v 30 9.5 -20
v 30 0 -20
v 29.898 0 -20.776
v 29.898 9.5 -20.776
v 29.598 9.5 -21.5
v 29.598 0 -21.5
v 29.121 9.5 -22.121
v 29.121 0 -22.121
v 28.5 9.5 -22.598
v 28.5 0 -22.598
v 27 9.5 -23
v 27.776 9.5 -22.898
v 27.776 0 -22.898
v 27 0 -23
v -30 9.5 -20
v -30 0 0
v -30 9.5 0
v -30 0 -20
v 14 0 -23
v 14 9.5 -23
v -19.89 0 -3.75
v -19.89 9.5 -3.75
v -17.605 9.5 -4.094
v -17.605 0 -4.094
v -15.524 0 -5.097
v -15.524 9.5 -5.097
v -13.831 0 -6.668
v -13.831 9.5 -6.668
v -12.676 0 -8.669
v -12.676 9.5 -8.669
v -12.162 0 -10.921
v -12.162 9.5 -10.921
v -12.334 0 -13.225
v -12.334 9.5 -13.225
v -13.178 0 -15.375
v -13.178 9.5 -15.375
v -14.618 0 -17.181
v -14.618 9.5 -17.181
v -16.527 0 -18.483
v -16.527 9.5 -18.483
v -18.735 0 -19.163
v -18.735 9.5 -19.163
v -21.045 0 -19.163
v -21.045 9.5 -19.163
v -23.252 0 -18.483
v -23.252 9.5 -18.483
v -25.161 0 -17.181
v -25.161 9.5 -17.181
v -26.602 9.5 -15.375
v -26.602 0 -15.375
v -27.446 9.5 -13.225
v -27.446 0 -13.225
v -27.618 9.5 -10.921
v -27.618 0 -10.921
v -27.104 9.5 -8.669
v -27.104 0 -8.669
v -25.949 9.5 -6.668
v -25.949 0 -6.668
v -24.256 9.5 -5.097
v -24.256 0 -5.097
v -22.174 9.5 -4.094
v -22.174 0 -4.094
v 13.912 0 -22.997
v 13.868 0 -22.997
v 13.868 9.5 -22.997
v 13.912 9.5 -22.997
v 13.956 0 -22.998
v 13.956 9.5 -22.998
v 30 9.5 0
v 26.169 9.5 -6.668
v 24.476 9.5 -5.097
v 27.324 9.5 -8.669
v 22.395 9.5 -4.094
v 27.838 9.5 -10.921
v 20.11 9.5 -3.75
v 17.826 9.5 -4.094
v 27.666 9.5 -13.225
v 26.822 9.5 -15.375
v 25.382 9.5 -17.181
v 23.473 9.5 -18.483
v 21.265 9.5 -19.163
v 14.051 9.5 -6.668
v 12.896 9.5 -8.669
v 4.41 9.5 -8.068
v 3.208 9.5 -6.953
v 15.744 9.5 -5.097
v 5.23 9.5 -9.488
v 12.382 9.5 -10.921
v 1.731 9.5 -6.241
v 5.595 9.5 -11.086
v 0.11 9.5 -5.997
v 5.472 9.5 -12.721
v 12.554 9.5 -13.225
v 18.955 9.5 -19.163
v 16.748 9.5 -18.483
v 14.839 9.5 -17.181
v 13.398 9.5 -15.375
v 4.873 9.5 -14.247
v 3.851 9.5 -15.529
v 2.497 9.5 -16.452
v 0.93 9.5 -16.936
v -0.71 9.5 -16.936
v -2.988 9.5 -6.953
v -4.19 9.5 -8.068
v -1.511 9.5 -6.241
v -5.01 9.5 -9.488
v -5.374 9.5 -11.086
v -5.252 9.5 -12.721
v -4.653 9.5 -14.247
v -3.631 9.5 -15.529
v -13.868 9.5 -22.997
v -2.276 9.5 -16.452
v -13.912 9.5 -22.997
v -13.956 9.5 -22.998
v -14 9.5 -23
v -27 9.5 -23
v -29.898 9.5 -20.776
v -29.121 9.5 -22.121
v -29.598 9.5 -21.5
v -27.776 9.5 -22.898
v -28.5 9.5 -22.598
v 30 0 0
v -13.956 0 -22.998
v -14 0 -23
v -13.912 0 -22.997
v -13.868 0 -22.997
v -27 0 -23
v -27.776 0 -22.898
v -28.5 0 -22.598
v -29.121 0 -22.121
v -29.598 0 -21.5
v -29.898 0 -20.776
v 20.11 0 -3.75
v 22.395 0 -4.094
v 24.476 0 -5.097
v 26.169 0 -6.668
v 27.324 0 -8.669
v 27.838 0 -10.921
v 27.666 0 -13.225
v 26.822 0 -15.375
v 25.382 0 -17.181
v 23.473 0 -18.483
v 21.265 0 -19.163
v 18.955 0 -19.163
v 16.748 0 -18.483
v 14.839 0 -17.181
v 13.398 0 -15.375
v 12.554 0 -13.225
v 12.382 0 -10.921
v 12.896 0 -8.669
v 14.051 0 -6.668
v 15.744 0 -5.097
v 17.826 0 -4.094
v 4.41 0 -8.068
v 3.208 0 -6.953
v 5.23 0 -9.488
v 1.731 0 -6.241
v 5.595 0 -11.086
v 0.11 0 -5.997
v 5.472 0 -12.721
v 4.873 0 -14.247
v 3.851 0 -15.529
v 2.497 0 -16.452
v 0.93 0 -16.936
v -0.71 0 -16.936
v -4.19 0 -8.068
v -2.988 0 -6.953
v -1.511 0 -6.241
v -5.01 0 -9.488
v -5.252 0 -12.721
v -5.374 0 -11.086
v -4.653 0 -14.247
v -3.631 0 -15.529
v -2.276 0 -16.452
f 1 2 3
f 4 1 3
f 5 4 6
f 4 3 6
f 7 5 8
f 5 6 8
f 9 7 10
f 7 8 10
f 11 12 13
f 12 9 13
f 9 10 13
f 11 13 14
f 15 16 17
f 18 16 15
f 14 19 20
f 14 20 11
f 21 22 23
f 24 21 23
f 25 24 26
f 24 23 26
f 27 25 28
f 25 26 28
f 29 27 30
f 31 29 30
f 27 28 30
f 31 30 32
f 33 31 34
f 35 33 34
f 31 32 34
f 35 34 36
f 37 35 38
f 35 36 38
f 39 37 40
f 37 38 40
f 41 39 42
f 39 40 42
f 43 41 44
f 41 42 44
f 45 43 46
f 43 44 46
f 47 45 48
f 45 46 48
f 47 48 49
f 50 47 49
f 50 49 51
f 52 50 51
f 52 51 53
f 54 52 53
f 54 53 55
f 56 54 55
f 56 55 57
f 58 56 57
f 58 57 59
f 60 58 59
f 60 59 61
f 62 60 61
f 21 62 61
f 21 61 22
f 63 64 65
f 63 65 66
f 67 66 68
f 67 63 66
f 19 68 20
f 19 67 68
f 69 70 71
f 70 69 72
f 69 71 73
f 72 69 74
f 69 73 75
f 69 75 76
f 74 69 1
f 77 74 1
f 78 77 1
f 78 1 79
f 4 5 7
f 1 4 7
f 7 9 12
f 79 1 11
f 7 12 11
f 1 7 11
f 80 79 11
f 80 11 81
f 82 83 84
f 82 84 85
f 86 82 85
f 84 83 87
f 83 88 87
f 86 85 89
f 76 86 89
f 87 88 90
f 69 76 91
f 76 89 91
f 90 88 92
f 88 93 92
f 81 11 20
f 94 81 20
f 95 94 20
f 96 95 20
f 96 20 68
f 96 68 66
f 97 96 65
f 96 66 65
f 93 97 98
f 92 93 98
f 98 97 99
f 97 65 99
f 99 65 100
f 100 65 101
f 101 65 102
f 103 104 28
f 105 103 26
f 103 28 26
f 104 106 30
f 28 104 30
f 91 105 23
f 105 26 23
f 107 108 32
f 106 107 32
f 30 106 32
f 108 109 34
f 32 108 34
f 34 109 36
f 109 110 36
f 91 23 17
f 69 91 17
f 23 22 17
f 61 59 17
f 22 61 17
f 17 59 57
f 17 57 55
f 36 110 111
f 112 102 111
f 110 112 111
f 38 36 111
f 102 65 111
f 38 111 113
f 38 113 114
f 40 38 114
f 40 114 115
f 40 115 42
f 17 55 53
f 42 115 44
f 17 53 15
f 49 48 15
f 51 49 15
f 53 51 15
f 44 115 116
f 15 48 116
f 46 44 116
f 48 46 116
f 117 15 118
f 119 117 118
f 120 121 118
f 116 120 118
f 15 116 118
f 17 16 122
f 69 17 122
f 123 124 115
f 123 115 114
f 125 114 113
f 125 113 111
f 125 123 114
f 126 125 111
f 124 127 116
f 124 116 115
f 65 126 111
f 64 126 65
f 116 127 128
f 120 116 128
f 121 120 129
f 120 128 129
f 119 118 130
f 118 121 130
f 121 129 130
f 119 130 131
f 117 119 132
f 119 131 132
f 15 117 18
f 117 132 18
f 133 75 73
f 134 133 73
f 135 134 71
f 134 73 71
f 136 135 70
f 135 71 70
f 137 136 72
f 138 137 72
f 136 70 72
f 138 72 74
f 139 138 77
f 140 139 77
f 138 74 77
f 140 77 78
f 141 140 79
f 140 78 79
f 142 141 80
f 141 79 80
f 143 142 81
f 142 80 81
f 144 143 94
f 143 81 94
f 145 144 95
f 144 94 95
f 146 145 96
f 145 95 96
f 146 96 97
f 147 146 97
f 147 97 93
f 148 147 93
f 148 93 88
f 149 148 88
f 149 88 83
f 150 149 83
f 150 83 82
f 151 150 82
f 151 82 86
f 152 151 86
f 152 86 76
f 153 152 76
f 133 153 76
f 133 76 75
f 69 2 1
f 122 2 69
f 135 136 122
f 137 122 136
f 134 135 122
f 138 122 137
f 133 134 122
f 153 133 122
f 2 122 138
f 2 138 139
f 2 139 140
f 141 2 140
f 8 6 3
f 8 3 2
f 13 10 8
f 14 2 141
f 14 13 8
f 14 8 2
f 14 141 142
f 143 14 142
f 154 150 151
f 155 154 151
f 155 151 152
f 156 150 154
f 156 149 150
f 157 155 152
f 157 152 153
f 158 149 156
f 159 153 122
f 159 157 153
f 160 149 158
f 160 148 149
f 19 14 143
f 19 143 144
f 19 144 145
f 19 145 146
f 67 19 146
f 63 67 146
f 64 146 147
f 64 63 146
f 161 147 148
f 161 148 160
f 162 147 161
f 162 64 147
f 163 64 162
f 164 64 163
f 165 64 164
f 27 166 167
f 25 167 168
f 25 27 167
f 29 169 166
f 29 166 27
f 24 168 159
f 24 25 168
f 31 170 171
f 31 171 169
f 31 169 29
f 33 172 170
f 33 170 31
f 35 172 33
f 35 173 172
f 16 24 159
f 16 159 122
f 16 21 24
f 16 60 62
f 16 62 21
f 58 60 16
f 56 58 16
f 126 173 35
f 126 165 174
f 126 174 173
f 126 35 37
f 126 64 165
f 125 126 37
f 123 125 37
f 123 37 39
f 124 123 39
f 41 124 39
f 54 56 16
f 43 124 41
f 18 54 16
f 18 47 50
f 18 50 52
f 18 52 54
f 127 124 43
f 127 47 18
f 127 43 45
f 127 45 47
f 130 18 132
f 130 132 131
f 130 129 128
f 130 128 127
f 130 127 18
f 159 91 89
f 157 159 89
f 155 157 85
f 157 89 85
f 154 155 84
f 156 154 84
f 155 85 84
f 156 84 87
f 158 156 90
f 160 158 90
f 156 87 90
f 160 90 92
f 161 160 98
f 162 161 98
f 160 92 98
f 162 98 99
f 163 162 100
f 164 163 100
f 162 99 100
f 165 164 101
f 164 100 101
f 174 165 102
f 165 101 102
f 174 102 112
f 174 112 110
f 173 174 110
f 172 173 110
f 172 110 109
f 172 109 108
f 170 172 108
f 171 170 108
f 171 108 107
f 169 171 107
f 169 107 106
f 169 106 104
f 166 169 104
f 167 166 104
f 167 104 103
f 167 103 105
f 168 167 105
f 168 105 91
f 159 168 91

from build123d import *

# Parameters (mm, degrees)
EXTRUDE_1_DEPTH     = 9.5
FILLET_1_R          = 3
SKETCH_2_R          = 7.75
SKETCH_2_R_2        = 5.5
CUT_EXTRUDE_2_DEPTH = 10


with BuildPart() as part:
    # 草图1 → 凸台-拉伸1 (new body)
    with BuildSketch(Plane(origin=(0, 0, 0), x_dir=(1, 0, 0), z_dir=(0, 1, 0))):
        Polygon((0, 0), (-30, 0), (-30, 23), (-14, 23), (-14, 22.997077799), (14, 22.997077799), (14, 23), (30, 23), (30, 0), align=None)
    extrude(amount=EXTRUDE_1_DEPTH)

    # 圆角1
    # the kernel refuses this fillet: 3 mm, written as the material it adds along each edge
    with BuildSketch(Plane(origin=(14, 0, -22.997077799), x_dir=(-2.4315329398816435e-12, 0, -1.0), z_dir=(0, 1, 0))) as fillet_1_piece_1:
        with BuildLine():
            CenterArc((3, 0.132380758), FILLET_1_R, 180, 2.529107474)
            Line((0, 0.132380758), (0, 0))
            Line((0, 0), (0.002922201, 0))
        make_face()
    extrude(amount=9.5)
    with BuildSketch(Plane(origin=(-14, 0, -22.997077799), x_dir=(1, 0, 0), z_dir=(0, 1, 0))) as fillet_1_piece_2:
        with BuildLine():
            CenterArc((0.132380758, 3), FILLET_1_R, 267.470892526, 2.529107474)
            Line((0, 0.002922201), (0, 0))
            Line((0, 0), (0.132380758, 0))
        make_face()
    extrude(amount=9.5)
    # the kernel refuses this fillet: 3 mm, written as the material it takes off along each edge
    with BuildSketch(Plane(origin=(30, -7.5, -23), x_dir=(0, 0, 1), z_dir=(0, 1, 0))) as fillet_1_2_piece_1:
        with BuildLine():
            CenterArc((FILLET_1_R, -FILLET_1_R), FILLET_1_R, 90, 90)
            Line((0, -FILLET_1_R), (0, 0))
            Line((0, 0), (FILLET_1_R, 0))
        make_face()
    extrude(amount=24.5, mode=Mode.SUBTRACT)
    with BuildSketch(Plane(origin=(-30, -7.5, -23), x_dir=(0, 0, 1), z_dir=(0, 1, 0))) as fillet_1_2_piece_2:
        with BuildLine():
            CenterArc((FILLET_1_R, FILLET_1_R), FILLET_1_R, 180, 90)
            Line((0, FILLET_1_R), (0, 0))
            Line((0, 0), (FILLET_1_R, 0))
        make_face()
    extrude(amount=24.5, mode=Mode.SUBTRACT)

    # 草图2 → 切除-拉伸2 (cut)
    with BuildSketch(Plane(origin=(0, 9.5, 0), x_dir=(1, 0, 0), z_dir=(0, 1, 0))):
        with Locations(Location((20.11016513, 11.5, 0), (0, 0, 270))):
            Circle(SKETCH_2_R)
        with Locations(Location((-19.88983487, 11.5, 0), (0, 0, 270))):
            Circle(SKETCH_2_R)
        with Locations(Location((0.11016513, 11.497077799, 0), (0, 0, 270))):
            Circle(SKETCH_2_R_2)
    extrude(amount=-CUT_EXTRUDE_2_DEPTH, mode=Mode.SUBTRACT)


solid = part.part
